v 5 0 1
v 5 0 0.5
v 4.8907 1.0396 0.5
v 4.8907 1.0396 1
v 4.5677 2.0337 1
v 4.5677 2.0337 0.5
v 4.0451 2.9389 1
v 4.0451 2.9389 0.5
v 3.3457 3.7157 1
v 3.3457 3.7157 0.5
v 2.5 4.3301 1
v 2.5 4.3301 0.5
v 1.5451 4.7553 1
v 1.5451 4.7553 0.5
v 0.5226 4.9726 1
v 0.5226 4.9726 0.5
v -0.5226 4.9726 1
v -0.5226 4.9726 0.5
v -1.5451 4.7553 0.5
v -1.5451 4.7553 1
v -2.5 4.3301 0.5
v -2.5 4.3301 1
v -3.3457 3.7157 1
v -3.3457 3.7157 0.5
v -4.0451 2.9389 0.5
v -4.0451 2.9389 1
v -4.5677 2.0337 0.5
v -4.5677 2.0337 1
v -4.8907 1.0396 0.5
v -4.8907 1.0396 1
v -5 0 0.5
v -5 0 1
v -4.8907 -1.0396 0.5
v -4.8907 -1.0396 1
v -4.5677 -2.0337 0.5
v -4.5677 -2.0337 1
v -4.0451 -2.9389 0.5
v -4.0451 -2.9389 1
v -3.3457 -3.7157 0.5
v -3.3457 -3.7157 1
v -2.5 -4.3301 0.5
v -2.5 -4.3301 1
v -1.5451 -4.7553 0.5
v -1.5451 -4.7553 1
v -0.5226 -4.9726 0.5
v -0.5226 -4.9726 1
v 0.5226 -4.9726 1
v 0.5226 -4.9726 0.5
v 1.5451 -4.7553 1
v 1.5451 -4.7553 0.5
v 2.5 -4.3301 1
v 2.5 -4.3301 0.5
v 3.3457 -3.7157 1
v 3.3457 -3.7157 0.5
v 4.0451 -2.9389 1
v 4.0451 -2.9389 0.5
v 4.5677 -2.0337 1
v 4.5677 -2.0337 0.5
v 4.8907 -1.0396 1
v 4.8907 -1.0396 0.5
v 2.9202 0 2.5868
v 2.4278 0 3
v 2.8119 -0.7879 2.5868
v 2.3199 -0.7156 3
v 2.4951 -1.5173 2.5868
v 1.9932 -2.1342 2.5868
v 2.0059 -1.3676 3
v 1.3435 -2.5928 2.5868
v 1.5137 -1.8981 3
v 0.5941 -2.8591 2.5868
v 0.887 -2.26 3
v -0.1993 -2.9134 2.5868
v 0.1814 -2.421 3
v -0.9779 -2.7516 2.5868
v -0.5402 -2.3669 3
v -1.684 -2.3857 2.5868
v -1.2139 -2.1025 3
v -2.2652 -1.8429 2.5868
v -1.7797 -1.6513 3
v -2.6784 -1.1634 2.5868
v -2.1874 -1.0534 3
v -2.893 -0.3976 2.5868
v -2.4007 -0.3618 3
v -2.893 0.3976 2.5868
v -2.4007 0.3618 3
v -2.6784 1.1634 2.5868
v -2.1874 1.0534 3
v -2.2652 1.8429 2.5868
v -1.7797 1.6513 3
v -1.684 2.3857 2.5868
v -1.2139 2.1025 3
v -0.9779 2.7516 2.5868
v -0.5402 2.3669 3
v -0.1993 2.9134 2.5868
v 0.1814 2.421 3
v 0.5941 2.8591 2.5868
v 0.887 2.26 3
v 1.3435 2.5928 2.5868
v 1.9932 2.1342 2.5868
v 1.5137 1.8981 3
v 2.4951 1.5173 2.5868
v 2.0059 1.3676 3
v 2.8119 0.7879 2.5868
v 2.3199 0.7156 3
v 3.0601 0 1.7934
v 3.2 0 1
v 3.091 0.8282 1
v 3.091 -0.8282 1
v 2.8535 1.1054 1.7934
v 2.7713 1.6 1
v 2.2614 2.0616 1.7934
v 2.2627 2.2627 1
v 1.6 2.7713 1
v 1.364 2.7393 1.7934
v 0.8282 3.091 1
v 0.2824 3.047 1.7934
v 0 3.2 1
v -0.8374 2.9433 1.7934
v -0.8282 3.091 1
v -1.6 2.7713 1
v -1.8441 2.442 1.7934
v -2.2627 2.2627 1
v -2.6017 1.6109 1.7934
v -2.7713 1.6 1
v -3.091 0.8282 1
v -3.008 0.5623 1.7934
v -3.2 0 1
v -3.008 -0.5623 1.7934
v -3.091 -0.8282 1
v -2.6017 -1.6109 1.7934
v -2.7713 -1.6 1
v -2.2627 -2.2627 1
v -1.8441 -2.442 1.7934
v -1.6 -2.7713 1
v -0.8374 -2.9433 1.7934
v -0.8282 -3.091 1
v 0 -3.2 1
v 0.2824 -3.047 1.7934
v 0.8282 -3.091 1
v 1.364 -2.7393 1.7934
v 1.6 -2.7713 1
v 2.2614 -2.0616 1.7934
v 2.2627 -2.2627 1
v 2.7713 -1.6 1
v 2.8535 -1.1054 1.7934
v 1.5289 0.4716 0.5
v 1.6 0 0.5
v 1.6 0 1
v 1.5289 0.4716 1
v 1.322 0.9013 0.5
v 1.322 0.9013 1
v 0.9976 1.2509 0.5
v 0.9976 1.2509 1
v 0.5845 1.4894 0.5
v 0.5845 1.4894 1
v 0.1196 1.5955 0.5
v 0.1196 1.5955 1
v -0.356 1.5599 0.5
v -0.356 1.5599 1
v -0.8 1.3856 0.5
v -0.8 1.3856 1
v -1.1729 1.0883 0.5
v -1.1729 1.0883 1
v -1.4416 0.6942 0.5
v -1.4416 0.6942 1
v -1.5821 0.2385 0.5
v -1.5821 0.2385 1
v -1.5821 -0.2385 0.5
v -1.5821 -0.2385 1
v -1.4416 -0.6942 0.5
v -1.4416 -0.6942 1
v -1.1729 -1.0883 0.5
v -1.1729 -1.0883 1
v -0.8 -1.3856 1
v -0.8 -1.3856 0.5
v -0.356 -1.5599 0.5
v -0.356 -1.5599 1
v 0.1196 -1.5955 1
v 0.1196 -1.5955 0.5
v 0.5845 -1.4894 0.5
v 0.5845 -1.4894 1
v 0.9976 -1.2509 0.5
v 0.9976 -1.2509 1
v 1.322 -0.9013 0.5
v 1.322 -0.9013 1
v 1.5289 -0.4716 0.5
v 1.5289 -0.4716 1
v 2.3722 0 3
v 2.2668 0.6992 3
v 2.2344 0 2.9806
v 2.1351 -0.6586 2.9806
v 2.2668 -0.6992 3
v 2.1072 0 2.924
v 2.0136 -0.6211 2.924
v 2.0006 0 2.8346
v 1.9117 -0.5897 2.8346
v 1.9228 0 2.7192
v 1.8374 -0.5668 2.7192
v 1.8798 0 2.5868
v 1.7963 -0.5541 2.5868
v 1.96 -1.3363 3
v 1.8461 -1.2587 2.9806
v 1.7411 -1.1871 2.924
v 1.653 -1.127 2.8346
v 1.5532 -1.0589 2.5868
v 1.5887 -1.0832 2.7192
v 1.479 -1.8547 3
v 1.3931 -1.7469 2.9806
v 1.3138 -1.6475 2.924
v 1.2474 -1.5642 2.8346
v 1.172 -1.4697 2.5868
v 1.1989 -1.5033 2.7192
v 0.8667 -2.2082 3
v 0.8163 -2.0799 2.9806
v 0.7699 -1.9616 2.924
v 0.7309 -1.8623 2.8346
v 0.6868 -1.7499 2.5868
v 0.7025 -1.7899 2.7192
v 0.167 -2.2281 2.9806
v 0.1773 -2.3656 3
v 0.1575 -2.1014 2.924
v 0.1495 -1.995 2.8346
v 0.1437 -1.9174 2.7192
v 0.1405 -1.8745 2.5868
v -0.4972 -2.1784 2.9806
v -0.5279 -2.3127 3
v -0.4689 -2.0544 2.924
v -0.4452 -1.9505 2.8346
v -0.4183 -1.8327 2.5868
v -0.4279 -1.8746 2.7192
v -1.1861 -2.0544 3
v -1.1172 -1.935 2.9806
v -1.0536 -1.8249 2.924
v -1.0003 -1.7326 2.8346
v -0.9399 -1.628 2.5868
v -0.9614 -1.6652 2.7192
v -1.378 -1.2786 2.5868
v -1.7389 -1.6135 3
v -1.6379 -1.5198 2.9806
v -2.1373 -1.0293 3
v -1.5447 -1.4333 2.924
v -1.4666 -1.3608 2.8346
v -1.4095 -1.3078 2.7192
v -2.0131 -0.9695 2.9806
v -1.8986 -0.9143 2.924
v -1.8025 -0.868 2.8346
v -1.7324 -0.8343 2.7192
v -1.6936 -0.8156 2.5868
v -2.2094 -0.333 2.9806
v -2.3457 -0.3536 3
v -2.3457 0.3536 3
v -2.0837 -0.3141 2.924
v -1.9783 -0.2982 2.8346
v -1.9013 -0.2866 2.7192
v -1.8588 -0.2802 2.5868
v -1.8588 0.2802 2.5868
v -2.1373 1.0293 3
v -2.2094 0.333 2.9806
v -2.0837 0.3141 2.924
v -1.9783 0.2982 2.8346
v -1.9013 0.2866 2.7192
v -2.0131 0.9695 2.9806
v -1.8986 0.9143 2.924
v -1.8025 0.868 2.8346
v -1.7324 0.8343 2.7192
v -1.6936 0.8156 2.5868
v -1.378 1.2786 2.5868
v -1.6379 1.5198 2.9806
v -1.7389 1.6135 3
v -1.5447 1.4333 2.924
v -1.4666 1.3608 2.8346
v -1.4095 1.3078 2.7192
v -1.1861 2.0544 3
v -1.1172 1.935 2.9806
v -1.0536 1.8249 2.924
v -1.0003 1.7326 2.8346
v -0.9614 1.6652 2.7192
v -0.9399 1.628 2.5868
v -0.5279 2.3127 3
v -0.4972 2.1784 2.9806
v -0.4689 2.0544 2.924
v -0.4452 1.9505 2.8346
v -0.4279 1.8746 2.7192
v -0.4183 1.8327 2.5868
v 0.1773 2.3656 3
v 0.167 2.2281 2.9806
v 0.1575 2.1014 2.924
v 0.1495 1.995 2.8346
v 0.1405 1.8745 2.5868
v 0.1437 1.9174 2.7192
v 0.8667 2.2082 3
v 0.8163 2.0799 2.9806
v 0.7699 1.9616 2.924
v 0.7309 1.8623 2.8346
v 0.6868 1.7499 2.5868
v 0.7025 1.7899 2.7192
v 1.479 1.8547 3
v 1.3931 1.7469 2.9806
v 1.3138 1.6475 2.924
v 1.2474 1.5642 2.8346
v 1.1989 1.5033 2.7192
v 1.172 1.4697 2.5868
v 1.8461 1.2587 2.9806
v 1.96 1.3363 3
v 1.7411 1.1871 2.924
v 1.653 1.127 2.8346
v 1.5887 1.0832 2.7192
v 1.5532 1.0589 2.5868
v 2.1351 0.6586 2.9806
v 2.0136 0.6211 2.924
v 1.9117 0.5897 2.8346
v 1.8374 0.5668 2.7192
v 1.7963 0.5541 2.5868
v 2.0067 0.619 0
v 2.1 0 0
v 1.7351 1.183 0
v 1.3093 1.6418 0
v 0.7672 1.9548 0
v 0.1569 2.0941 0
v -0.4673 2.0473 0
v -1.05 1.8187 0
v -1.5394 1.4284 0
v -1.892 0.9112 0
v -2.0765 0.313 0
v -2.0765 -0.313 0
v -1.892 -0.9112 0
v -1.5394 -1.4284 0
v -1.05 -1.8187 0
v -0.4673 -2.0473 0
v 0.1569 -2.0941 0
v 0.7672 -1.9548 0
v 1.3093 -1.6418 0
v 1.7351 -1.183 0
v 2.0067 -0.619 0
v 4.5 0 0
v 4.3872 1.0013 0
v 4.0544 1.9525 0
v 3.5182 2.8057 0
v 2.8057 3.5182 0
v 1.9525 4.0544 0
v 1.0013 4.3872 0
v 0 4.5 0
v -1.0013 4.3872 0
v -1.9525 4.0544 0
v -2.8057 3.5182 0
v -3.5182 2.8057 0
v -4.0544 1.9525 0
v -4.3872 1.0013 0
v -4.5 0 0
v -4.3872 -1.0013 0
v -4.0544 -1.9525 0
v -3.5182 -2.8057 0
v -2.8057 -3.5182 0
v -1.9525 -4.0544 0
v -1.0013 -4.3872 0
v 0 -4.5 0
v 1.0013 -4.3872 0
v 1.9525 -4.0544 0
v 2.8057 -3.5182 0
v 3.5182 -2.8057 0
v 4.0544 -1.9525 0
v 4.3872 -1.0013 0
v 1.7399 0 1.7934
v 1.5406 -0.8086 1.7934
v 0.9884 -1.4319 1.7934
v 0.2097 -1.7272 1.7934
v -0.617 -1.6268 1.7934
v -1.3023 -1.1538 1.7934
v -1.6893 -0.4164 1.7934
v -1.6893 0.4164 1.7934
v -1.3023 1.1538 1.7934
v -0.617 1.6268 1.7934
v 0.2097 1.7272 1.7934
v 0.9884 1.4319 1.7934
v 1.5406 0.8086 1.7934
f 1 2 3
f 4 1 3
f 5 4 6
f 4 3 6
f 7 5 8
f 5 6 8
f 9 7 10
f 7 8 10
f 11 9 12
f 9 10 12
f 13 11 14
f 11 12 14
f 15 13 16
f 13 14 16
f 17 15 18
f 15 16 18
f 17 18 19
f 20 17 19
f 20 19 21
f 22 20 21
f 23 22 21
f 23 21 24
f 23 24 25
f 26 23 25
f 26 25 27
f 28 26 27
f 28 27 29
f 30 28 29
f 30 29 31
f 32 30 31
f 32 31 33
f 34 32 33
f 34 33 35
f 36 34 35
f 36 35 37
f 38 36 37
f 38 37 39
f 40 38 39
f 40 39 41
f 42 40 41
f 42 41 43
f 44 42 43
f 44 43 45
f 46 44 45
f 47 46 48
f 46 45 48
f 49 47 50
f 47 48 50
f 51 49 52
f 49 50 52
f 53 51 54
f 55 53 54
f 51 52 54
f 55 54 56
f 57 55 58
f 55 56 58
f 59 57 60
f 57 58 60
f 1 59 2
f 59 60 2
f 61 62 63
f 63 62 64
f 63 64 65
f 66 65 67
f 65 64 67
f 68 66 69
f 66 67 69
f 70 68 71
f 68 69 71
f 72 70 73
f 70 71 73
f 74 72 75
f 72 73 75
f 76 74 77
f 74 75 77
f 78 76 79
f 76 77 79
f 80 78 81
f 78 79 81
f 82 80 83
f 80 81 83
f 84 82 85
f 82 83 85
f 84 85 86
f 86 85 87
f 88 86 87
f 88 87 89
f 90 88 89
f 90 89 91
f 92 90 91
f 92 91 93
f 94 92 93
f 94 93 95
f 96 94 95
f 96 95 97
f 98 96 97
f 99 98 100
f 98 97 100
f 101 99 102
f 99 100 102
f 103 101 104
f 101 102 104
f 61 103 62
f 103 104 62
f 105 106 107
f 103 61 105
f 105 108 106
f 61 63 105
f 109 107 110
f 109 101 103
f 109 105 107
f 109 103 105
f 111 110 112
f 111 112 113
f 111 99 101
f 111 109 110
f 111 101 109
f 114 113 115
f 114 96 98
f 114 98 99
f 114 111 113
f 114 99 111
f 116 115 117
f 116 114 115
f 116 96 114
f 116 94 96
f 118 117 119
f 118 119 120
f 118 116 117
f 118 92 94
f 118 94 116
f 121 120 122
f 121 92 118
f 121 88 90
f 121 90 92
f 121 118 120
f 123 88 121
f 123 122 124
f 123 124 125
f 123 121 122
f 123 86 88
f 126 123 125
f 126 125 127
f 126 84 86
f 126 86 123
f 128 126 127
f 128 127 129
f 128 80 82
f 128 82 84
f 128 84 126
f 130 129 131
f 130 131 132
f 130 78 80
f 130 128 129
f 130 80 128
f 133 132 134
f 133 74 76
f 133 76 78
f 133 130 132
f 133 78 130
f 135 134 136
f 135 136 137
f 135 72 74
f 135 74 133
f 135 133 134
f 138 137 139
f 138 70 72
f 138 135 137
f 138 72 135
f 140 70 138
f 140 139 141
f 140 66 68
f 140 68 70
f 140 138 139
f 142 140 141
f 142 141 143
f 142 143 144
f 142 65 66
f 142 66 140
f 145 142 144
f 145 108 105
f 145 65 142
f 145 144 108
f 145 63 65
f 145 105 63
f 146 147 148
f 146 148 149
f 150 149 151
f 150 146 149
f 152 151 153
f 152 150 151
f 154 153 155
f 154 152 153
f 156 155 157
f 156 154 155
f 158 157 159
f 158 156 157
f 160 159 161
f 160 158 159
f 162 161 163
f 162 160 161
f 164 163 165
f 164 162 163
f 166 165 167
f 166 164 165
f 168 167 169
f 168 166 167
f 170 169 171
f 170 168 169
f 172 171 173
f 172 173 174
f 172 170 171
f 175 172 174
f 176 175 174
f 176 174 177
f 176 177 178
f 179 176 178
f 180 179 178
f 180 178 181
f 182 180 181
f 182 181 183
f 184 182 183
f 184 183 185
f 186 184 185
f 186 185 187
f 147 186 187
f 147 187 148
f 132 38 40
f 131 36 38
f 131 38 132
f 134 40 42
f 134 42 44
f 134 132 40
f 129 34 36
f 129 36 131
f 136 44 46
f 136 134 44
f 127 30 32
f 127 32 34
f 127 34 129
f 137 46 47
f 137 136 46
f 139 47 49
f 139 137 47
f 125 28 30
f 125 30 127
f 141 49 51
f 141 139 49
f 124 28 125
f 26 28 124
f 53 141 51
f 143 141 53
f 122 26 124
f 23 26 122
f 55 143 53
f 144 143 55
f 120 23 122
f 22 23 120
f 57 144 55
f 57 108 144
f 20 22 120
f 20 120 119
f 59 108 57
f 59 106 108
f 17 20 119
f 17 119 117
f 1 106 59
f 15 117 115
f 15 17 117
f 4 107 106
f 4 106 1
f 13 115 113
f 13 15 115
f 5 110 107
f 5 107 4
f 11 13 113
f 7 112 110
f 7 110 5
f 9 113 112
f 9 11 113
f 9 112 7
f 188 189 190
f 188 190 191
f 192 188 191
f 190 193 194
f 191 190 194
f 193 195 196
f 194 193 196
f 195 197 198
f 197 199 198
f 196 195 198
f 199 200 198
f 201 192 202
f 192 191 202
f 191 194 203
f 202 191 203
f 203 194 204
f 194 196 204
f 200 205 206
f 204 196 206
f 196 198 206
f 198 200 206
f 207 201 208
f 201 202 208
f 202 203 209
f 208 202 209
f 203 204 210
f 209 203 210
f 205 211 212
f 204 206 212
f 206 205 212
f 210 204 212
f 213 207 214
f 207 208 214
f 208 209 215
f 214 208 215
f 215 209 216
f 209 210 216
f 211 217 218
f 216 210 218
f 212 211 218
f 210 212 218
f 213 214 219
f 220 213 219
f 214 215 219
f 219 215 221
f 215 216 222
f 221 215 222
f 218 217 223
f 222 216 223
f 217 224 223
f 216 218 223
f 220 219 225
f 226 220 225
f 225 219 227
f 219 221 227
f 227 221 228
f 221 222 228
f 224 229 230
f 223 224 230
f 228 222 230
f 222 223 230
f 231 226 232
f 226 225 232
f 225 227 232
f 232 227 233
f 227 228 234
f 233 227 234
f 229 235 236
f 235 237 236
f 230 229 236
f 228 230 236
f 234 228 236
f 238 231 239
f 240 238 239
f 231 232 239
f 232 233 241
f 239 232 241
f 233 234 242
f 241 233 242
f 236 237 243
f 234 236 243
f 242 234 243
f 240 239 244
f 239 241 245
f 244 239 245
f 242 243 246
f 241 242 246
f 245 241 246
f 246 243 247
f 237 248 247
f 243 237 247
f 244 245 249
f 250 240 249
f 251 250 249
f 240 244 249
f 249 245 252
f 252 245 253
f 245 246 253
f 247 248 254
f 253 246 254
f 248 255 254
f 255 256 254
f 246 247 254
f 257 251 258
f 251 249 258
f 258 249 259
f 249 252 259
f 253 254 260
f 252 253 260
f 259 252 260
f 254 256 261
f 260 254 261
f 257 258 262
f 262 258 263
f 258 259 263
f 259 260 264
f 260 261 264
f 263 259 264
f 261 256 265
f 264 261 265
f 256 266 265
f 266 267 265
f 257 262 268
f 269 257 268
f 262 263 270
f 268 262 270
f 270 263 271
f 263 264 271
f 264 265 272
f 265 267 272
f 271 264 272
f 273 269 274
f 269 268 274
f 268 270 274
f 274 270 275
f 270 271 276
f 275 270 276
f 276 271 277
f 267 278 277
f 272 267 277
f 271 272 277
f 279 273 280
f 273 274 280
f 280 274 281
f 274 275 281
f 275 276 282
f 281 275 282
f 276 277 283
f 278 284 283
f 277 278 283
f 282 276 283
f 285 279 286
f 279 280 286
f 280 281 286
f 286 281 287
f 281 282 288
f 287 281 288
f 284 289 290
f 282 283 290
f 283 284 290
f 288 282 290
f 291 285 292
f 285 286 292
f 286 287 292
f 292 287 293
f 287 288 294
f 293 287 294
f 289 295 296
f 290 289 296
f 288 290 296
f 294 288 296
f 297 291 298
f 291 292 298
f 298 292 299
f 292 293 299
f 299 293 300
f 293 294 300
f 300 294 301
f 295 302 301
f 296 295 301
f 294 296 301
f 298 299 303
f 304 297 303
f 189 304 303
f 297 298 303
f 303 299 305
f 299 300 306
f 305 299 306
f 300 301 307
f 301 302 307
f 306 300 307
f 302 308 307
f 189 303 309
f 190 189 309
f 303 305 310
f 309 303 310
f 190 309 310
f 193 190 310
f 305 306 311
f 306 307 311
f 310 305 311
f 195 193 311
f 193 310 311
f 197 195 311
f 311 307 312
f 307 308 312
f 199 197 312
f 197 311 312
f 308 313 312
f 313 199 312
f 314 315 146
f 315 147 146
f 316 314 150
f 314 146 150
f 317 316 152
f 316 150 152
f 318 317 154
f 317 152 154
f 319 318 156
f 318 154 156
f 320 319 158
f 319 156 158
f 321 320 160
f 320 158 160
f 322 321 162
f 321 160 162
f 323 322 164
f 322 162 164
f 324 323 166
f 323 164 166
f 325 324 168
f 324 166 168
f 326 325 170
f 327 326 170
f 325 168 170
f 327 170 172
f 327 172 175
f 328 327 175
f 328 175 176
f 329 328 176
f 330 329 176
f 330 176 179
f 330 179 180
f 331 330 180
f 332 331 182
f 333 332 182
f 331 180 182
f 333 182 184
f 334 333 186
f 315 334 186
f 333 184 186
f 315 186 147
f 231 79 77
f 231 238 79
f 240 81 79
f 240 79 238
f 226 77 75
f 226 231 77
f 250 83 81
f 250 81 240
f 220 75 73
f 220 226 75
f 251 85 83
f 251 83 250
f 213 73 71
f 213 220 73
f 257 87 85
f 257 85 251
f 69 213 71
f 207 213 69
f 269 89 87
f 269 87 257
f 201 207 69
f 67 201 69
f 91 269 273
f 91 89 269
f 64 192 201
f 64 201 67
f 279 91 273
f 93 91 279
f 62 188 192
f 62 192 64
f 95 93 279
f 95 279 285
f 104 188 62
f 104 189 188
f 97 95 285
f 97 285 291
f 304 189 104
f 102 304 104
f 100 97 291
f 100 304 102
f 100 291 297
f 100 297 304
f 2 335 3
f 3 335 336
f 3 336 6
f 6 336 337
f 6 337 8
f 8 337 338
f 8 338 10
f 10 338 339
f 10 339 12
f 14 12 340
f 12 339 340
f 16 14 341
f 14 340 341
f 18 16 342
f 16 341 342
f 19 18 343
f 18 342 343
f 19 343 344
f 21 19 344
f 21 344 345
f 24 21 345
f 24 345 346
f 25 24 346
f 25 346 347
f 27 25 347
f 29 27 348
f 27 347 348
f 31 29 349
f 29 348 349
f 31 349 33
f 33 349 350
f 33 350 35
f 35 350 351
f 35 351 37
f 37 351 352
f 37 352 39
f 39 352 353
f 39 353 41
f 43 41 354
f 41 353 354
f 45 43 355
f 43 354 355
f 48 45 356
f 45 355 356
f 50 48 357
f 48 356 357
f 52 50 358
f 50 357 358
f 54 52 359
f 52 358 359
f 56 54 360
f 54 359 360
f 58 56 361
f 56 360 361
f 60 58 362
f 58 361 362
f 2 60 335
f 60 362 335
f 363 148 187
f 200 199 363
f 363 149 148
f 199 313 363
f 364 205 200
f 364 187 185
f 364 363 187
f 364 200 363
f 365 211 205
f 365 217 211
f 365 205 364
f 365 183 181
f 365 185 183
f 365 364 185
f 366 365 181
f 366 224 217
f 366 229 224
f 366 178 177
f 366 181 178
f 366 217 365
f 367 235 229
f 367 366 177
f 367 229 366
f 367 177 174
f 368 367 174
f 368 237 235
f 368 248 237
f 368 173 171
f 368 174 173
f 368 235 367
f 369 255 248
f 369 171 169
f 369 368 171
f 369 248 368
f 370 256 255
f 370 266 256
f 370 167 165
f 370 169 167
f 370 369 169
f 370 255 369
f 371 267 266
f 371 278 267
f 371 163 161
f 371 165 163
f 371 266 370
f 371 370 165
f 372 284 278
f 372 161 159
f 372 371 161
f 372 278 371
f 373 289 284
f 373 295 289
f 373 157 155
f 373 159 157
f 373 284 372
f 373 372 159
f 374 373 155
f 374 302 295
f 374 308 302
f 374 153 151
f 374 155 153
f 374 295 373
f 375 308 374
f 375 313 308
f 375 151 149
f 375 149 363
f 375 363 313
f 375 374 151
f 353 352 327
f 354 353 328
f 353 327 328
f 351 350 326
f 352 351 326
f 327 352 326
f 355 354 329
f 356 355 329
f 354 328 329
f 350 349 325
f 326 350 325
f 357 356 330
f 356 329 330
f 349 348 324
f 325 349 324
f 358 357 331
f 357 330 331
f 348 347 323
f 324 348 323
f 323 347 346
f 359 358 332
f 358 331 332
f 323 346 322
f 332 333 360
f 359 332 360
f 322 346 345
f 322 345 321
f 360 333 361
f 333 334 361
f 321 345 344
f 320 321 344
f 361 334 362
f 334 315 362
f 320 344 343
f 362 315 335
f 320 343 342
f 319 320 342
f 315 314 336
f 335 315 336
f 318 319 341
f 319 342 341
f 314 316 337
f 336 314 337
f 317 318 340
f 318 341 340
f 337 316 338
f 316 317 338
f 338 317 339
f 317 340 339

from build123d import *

# Parameters (mm, degrees)
F0_R     = 5
F0_R_2   = 1.6
F1_DEPTH = 1
F2_R     = 3.2
F2_R_2   = 1.6
F3_DEPTH = 2
F3_TAPER = 10
F5_R     = 0.5


# Not quite as in the source:
# - a fillet or chamfer that OpenCascade refuses, or shapes differently, is made with other operations: its cross-section is extruded or revolved along the edge and cut away or added


with BuildPart() as f1:
    # F0 (on Top) → F1 (new body)
    with BuildSketch(Plane.XY):
        Circle(F0_R)
        Circle(F0_R_2, mode=Mode.SUBTRACT)
    extrude(amount=F1_DEPTH)

    # F2 (on face) → F3 (join)
    with BuildSketch(Plane.XY.offset(1)):
        Circle(F2_R)
        Circle(F2_R_2, mode=Mode.SUBTRACT)
    extrude(amount=F3_DEPTH, taper=F3_TAPER)

    # F4: chamfer of 0.5 on 3 edges, made by hand

    # F4_s1 → F4_t2 (revolve, cut)
    with BuildSketch(Plane.XZ):
        Polygon((5, 0.5), (4.5, 0), (5, 0), align=None)
    revolve(axis=Axis((0, 0, 0), (0, 0, 1)), mode=Mode.SUBTRACT)

    # F4_s3 → F4_t4 (revolve, cut)
    with BuildSketch(Plane.XZ):
        Polygon((2.9202000995, 2.5868240888), (2.427796223, 3), (2.8473460386, 3), align=None)
    revolve(axis=Axis((0, 0, 3), (0, 0, -1)), mode=Mode.SUBTRACT)

    # F4_s5 → F4_t6 (revolve, cut)
    with BuildSketch(Plane.XZ):
        Polygon((2.1, 0), (1.6, 0.5), (1.6, 0), align=None)
    revolve(axis=Axis((0, 0, 0), (0, 0, 1)), mode=Mode.SUBTRACT)

    # F5
    f5_edges = [f1.edges().sort_by_distance(p)[0] for p in [
        (-1.952654, 0, 3),
    ]]
    fillet(f5_edges, radius=F5_R)


solid = f1.part
